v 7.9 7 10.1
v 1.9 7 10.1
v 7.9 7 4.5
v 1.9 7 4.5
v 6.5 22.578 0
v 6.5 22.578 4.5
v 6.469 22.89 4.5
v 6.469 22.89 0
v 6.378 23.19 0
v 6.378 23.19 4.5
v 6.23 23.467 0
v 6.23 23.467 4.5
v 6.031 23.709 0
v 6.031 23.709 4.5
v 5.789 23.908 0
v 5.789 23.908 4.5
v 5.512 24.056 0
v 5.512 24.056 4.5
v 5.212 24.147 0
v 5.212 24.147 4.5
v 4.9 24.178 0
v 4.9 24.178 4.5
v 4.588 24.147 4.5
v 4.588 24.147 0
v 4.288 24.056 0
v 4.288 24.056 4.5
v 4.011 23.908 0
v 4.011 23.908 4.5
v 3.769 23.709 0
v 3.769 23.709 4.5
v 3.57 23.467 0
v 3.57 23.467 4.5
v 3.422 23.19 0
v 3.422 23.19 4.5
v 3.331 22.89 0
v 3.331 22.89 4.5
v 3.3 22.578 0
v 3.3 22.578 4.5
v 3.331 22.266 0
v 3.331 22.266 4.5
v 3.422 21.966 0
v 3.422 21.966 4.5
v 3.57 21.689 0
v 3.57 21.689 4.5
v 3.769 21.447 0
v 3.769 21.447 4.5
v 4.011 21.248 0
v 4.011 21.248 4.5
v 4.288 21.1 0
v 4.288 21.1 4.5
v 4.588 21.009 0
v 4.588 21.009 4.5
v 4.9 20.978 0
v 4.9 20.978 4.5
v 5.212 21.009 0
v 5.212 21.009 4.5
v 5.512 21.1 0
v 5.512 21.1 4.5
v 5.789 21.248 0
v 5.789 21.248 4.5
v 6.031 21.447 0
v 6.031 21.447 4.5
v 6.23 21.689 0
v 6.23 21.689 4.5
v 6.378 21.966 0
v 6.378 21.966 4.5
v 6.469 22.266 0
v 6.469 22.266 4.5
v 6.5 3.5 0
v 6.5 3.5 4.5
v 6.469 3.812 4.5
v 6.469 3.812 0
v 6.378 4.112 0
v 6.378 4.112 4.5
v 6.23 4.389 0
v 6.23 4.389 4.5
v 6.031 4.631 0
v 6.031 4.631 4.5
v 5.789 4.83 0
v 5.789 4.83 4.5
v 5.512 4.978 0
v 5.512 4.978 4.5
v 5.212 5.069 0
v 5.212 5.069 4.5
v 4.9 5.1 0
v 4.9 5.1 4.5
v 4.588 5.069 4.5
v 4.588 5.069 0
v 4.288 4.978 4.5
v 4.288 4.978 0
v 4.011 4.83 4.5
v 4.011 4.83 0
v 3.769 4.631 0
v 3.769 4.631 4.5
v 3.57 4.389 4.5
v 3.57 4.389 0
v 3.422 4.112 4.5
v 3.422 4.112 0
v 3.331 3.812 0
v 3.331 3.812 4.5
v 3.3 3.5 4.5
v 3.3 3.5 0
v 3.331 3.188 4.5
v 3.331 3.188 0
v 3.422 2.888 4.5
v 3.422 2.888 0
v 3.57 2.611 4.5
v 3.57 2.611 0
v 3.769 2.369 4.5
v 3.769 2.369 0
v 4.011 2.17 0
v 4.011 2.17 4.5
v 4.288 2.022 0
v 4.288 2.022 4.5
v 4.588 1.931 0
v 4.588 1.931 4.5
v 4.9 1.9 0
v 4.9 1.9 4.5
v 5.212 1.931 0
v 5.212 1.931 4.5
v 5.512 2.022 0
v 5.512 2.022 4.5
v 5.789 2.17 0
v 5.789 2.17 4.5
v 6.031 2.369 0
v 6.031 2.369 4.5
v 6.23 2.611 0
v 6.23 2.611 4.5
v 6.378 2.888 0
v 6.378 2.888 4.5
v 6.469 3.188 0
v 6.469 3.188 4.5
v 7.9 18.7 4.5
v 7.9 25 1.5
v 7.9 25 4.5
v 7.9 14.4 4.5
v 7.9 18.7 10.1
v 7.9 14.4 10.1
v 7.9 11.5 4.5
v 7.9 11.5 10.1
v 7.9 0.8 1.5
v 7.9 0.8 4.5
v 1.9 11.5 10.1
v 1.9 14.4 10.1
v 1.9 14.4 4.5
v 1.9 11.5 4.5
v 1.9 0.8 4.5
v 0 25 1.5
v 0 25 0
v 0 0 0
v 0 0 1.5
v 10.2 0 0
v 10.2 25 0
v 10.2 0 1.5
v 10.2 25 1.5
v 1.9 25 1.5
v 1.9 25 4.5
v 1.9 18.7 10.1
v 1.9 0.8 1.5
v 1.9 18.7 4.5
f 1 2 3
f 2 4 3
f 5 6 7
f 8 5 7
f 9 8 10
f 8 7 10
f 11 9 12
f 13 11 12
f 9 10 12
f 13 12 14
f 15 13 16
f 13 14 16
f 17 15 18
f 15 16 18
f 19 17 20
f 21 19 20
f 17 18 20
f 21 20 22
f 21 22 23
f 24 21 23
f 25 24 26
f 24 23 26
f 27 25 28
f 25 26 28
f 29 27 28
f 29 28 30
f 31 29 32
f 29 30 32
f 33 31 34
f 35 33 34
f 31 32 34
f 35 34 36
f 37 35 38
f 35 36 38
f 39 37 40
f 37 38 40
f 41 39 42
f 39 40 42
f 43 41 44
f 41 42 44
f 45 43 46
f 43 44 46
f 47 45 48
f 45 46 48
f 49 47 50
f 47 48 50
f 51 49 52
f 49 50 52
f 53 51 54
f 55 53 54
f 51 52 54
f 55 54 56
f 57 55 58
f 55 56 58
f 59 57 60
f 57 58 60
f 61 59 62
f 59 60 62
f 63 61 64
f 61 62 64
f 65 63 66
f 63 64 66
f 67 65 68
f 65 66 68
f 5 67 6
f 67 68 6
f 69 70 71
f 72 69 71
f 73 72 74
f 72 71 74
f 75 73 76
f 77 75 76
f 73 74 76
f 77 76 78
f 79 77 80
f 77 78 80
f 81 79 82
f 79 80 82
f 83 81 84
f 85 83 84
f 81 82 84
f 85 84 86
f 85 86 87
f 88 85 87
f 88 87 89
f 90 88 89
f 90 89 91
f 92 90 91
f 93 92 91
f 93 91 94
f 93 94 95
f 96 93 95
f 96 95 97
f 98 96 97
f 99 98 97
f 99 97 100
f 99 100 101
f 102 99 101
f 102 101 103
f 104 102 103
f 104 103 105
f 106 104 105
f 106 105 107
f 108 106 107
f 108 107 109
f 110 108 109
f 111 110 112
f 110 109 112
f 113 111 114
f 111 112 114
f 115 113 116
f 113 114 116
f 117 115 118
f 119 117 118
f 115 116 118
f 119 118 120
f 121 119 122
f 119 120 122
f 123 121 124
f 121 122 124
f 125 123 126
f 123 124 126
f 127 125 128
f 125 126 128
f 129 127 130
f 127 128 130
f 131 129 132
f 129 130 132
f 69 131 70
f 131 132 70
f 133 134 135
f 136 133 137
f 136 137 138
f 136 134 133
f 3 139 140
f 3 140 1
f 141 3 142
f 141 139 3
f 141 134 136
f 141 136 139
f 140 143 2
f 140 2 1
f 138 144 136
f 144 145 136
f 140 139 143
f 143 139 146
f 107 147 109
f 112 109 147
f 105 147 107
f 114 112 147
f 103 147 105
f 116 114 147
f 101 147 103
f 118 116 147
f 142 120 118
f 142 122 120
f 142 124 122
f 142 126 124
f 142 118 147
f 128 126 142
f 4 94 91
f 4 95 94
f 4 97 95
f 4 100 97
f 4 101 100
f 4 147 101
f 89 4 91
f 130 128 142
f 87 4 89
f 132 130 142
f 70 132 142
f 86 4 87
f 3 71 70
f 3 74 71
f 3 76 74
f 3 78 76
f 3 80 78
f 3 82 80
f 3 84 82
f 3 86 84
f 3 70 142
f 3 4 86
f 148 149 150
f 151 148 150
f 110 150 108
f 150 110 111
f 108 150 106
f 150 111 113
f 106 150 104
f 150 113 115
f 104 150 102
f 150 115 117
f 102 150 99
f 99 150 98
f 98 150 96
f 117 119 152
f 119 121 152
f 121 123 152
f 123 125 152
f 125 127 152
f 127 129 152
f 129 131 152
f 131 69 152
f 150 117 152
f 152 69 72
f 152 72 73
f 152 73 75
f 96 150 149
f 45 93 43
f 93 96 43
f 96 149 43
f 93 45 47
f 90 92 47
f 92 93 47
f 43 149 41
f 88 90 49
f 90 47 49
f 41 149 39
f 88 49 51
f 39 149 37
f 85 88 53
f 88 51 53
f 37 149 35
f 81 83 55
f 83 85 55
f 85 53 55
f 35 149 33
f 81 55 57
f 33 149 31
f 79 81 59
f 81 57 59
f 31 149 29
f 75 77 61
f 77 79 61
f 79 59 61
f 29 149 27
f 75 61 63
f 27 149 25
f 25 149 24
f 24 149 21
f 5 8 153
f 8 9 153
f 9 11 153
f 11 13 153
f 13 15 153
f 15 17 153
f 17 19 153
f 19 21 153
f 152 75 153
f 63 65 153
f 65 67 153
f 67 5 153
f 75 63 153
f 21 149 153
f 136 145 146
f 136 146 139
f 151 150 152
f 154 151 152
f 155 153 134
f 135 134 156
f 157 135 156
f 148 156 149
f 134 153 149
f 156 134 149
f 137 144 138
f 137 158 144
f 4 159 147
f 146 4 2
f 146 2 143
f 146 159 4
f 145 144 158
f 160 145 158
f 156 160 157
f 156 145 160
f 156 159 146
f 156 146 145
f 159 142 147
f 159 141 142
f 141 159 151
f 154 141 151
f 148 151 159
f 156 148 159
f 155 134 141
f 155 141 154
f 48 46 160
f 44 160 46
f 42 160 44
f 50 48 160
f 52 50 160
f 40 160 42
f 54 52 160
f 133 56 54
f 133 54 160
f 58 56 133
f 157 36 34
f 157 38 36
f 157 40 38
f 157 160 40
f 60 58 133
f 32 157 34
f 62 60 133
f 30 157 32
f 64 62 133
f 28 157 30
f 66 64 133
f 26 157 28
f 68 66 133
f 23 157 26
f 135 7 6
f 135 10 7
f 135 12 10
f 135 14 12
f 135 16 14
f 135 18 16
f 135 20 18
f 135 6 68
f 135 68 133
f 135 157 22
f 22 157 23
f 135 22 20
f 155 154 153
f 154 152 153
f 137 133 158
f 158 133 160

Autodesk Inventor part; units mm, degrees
ref_plane "YZ Plane" through (0, 0, 0) normal (1, 0, 0) x (0, 1, 0)
ref_plane "XZ Plane" through (0, 0, 0) normal (0, 1, 0) x (-1, 0, 0)
ref_plane "XY Plane" through (0, 0, 0) normal (0, 0, 1) x (1, 0, 0)
sketch "Sketch1" plane through (0, 0, 0) normal (0, 0, 1) x (1, 0, 0)
  line L0 (0, 0) -> (10.2, 0)
  line L1 (10.2, 0) -> (10.2, 25)
  line L2 (10.2, 25) -> (0, 25)
  line L3 (0, 25) -> (0, 0)
  dimension "d0" = 10.2
  dimension "d1" = 25
extrude "Extrusion1" add sketch "Sketch1" along normal blind 1.5
sketch "Sketch2" plane through (0, 0, 1.5) normal (0, 0, 1) x (1, 0, 0)
  line L0 (10.2, 0) -> (10.2, 25) projected
  line L1 (10.2, 25) -> (0, 25) projected
  line L2 (1.9, 25) -> (7.9, 25)
  line L3 (7.9, 25) -> (7.9, 0.8)
  line L4 (7.9, 0.8) -> (1.9, 0.8)
  line L5 (1.9, 0.8) -> (1.9, 25)
  dimension "d4" = 6
  dimension "d5" = 24.2
  dimension "d6" = 2.3
  dimension "d7" = 0
extrude "Extrusion2" add sketch "Sketch2" along normal blind 3
sketch "Sketch3" plane through (0, 0, 4.5) normal (0, 0, 1) x (1, 0, 0)
  line L0 (1.9, 25) -> (1.9, 0.8) projected
  line L1 (7.9, 0.8) -> (7.9, 25) projected
  line L2 (1.9, 7) -> (7.9, 7)
  line L3 (7.9, 7) -> (7.9, 11.5)
  line L4 (7.9, 11.5) -> (1.9, 11.5)
  line L5 (1.9, 11.5) -> (1.9, 7)
  line L6 (1.9, 14.4) -> (7.9, 14.4)
  line L7 (7.9, 14.4) -> (7.9, 18.7)
  line L8 (7.9, 18.7) -> (1.9, 18.7)
  line L9 (1.9, 18.7) -> (1.9, 14.4)
  line L10 (1.9, 0.8) -> (7.9, 0.8) projected
  point P0 (0, 0)
  dimension "d10" = 4.5
  dimension "d11" = 4.3
  dimension "d12" = 2.9
  dimension "d15" = 6.2
extrude "Extrusion3" add sketch "Sketch3" along normal blind 5.6 contours L8 L1 L6 L0 | L4 L1 L2 L0
sketch "Sketch4" plane through (0, 0, 4.5) normal (0, 0, 1) x (1, 0, 0)
  line L0 (1.9, 7) -> (1.9, 0.8) projected
  line L1 (1.9, 0.8) -> (7.9, 0.8) projected
  circle A0 centre (4.9, 3.5) radius 1.6
  line L2 (0, 25) -> (0, 0) projected
  dimension "d16" = 3.2
  dimension "d18" = 3
  dimension "d19" = 2.7
sketch "Sketch5" plane through (0, 0, 4.5) normal (0, 0, 1) x (1, 0, 0)
  circle A0 centre (4.9, 22.5779) radius 1.6
  circle A1 centre (4.9, 3.4779) radius 1.6
  point P0 (0, 0)
  dimension "d20" = 3.2
  dimension "d21" = 3.2
  dimension "d22" = 19.1
extrude "Extrusion4" cut sketch "Sketch5" against normal blind 5.6 contours A0
extrude "Extrusion5" cut sketch "Sketch4" against normal blind 5.6
properties part number "OptoEndStop"
